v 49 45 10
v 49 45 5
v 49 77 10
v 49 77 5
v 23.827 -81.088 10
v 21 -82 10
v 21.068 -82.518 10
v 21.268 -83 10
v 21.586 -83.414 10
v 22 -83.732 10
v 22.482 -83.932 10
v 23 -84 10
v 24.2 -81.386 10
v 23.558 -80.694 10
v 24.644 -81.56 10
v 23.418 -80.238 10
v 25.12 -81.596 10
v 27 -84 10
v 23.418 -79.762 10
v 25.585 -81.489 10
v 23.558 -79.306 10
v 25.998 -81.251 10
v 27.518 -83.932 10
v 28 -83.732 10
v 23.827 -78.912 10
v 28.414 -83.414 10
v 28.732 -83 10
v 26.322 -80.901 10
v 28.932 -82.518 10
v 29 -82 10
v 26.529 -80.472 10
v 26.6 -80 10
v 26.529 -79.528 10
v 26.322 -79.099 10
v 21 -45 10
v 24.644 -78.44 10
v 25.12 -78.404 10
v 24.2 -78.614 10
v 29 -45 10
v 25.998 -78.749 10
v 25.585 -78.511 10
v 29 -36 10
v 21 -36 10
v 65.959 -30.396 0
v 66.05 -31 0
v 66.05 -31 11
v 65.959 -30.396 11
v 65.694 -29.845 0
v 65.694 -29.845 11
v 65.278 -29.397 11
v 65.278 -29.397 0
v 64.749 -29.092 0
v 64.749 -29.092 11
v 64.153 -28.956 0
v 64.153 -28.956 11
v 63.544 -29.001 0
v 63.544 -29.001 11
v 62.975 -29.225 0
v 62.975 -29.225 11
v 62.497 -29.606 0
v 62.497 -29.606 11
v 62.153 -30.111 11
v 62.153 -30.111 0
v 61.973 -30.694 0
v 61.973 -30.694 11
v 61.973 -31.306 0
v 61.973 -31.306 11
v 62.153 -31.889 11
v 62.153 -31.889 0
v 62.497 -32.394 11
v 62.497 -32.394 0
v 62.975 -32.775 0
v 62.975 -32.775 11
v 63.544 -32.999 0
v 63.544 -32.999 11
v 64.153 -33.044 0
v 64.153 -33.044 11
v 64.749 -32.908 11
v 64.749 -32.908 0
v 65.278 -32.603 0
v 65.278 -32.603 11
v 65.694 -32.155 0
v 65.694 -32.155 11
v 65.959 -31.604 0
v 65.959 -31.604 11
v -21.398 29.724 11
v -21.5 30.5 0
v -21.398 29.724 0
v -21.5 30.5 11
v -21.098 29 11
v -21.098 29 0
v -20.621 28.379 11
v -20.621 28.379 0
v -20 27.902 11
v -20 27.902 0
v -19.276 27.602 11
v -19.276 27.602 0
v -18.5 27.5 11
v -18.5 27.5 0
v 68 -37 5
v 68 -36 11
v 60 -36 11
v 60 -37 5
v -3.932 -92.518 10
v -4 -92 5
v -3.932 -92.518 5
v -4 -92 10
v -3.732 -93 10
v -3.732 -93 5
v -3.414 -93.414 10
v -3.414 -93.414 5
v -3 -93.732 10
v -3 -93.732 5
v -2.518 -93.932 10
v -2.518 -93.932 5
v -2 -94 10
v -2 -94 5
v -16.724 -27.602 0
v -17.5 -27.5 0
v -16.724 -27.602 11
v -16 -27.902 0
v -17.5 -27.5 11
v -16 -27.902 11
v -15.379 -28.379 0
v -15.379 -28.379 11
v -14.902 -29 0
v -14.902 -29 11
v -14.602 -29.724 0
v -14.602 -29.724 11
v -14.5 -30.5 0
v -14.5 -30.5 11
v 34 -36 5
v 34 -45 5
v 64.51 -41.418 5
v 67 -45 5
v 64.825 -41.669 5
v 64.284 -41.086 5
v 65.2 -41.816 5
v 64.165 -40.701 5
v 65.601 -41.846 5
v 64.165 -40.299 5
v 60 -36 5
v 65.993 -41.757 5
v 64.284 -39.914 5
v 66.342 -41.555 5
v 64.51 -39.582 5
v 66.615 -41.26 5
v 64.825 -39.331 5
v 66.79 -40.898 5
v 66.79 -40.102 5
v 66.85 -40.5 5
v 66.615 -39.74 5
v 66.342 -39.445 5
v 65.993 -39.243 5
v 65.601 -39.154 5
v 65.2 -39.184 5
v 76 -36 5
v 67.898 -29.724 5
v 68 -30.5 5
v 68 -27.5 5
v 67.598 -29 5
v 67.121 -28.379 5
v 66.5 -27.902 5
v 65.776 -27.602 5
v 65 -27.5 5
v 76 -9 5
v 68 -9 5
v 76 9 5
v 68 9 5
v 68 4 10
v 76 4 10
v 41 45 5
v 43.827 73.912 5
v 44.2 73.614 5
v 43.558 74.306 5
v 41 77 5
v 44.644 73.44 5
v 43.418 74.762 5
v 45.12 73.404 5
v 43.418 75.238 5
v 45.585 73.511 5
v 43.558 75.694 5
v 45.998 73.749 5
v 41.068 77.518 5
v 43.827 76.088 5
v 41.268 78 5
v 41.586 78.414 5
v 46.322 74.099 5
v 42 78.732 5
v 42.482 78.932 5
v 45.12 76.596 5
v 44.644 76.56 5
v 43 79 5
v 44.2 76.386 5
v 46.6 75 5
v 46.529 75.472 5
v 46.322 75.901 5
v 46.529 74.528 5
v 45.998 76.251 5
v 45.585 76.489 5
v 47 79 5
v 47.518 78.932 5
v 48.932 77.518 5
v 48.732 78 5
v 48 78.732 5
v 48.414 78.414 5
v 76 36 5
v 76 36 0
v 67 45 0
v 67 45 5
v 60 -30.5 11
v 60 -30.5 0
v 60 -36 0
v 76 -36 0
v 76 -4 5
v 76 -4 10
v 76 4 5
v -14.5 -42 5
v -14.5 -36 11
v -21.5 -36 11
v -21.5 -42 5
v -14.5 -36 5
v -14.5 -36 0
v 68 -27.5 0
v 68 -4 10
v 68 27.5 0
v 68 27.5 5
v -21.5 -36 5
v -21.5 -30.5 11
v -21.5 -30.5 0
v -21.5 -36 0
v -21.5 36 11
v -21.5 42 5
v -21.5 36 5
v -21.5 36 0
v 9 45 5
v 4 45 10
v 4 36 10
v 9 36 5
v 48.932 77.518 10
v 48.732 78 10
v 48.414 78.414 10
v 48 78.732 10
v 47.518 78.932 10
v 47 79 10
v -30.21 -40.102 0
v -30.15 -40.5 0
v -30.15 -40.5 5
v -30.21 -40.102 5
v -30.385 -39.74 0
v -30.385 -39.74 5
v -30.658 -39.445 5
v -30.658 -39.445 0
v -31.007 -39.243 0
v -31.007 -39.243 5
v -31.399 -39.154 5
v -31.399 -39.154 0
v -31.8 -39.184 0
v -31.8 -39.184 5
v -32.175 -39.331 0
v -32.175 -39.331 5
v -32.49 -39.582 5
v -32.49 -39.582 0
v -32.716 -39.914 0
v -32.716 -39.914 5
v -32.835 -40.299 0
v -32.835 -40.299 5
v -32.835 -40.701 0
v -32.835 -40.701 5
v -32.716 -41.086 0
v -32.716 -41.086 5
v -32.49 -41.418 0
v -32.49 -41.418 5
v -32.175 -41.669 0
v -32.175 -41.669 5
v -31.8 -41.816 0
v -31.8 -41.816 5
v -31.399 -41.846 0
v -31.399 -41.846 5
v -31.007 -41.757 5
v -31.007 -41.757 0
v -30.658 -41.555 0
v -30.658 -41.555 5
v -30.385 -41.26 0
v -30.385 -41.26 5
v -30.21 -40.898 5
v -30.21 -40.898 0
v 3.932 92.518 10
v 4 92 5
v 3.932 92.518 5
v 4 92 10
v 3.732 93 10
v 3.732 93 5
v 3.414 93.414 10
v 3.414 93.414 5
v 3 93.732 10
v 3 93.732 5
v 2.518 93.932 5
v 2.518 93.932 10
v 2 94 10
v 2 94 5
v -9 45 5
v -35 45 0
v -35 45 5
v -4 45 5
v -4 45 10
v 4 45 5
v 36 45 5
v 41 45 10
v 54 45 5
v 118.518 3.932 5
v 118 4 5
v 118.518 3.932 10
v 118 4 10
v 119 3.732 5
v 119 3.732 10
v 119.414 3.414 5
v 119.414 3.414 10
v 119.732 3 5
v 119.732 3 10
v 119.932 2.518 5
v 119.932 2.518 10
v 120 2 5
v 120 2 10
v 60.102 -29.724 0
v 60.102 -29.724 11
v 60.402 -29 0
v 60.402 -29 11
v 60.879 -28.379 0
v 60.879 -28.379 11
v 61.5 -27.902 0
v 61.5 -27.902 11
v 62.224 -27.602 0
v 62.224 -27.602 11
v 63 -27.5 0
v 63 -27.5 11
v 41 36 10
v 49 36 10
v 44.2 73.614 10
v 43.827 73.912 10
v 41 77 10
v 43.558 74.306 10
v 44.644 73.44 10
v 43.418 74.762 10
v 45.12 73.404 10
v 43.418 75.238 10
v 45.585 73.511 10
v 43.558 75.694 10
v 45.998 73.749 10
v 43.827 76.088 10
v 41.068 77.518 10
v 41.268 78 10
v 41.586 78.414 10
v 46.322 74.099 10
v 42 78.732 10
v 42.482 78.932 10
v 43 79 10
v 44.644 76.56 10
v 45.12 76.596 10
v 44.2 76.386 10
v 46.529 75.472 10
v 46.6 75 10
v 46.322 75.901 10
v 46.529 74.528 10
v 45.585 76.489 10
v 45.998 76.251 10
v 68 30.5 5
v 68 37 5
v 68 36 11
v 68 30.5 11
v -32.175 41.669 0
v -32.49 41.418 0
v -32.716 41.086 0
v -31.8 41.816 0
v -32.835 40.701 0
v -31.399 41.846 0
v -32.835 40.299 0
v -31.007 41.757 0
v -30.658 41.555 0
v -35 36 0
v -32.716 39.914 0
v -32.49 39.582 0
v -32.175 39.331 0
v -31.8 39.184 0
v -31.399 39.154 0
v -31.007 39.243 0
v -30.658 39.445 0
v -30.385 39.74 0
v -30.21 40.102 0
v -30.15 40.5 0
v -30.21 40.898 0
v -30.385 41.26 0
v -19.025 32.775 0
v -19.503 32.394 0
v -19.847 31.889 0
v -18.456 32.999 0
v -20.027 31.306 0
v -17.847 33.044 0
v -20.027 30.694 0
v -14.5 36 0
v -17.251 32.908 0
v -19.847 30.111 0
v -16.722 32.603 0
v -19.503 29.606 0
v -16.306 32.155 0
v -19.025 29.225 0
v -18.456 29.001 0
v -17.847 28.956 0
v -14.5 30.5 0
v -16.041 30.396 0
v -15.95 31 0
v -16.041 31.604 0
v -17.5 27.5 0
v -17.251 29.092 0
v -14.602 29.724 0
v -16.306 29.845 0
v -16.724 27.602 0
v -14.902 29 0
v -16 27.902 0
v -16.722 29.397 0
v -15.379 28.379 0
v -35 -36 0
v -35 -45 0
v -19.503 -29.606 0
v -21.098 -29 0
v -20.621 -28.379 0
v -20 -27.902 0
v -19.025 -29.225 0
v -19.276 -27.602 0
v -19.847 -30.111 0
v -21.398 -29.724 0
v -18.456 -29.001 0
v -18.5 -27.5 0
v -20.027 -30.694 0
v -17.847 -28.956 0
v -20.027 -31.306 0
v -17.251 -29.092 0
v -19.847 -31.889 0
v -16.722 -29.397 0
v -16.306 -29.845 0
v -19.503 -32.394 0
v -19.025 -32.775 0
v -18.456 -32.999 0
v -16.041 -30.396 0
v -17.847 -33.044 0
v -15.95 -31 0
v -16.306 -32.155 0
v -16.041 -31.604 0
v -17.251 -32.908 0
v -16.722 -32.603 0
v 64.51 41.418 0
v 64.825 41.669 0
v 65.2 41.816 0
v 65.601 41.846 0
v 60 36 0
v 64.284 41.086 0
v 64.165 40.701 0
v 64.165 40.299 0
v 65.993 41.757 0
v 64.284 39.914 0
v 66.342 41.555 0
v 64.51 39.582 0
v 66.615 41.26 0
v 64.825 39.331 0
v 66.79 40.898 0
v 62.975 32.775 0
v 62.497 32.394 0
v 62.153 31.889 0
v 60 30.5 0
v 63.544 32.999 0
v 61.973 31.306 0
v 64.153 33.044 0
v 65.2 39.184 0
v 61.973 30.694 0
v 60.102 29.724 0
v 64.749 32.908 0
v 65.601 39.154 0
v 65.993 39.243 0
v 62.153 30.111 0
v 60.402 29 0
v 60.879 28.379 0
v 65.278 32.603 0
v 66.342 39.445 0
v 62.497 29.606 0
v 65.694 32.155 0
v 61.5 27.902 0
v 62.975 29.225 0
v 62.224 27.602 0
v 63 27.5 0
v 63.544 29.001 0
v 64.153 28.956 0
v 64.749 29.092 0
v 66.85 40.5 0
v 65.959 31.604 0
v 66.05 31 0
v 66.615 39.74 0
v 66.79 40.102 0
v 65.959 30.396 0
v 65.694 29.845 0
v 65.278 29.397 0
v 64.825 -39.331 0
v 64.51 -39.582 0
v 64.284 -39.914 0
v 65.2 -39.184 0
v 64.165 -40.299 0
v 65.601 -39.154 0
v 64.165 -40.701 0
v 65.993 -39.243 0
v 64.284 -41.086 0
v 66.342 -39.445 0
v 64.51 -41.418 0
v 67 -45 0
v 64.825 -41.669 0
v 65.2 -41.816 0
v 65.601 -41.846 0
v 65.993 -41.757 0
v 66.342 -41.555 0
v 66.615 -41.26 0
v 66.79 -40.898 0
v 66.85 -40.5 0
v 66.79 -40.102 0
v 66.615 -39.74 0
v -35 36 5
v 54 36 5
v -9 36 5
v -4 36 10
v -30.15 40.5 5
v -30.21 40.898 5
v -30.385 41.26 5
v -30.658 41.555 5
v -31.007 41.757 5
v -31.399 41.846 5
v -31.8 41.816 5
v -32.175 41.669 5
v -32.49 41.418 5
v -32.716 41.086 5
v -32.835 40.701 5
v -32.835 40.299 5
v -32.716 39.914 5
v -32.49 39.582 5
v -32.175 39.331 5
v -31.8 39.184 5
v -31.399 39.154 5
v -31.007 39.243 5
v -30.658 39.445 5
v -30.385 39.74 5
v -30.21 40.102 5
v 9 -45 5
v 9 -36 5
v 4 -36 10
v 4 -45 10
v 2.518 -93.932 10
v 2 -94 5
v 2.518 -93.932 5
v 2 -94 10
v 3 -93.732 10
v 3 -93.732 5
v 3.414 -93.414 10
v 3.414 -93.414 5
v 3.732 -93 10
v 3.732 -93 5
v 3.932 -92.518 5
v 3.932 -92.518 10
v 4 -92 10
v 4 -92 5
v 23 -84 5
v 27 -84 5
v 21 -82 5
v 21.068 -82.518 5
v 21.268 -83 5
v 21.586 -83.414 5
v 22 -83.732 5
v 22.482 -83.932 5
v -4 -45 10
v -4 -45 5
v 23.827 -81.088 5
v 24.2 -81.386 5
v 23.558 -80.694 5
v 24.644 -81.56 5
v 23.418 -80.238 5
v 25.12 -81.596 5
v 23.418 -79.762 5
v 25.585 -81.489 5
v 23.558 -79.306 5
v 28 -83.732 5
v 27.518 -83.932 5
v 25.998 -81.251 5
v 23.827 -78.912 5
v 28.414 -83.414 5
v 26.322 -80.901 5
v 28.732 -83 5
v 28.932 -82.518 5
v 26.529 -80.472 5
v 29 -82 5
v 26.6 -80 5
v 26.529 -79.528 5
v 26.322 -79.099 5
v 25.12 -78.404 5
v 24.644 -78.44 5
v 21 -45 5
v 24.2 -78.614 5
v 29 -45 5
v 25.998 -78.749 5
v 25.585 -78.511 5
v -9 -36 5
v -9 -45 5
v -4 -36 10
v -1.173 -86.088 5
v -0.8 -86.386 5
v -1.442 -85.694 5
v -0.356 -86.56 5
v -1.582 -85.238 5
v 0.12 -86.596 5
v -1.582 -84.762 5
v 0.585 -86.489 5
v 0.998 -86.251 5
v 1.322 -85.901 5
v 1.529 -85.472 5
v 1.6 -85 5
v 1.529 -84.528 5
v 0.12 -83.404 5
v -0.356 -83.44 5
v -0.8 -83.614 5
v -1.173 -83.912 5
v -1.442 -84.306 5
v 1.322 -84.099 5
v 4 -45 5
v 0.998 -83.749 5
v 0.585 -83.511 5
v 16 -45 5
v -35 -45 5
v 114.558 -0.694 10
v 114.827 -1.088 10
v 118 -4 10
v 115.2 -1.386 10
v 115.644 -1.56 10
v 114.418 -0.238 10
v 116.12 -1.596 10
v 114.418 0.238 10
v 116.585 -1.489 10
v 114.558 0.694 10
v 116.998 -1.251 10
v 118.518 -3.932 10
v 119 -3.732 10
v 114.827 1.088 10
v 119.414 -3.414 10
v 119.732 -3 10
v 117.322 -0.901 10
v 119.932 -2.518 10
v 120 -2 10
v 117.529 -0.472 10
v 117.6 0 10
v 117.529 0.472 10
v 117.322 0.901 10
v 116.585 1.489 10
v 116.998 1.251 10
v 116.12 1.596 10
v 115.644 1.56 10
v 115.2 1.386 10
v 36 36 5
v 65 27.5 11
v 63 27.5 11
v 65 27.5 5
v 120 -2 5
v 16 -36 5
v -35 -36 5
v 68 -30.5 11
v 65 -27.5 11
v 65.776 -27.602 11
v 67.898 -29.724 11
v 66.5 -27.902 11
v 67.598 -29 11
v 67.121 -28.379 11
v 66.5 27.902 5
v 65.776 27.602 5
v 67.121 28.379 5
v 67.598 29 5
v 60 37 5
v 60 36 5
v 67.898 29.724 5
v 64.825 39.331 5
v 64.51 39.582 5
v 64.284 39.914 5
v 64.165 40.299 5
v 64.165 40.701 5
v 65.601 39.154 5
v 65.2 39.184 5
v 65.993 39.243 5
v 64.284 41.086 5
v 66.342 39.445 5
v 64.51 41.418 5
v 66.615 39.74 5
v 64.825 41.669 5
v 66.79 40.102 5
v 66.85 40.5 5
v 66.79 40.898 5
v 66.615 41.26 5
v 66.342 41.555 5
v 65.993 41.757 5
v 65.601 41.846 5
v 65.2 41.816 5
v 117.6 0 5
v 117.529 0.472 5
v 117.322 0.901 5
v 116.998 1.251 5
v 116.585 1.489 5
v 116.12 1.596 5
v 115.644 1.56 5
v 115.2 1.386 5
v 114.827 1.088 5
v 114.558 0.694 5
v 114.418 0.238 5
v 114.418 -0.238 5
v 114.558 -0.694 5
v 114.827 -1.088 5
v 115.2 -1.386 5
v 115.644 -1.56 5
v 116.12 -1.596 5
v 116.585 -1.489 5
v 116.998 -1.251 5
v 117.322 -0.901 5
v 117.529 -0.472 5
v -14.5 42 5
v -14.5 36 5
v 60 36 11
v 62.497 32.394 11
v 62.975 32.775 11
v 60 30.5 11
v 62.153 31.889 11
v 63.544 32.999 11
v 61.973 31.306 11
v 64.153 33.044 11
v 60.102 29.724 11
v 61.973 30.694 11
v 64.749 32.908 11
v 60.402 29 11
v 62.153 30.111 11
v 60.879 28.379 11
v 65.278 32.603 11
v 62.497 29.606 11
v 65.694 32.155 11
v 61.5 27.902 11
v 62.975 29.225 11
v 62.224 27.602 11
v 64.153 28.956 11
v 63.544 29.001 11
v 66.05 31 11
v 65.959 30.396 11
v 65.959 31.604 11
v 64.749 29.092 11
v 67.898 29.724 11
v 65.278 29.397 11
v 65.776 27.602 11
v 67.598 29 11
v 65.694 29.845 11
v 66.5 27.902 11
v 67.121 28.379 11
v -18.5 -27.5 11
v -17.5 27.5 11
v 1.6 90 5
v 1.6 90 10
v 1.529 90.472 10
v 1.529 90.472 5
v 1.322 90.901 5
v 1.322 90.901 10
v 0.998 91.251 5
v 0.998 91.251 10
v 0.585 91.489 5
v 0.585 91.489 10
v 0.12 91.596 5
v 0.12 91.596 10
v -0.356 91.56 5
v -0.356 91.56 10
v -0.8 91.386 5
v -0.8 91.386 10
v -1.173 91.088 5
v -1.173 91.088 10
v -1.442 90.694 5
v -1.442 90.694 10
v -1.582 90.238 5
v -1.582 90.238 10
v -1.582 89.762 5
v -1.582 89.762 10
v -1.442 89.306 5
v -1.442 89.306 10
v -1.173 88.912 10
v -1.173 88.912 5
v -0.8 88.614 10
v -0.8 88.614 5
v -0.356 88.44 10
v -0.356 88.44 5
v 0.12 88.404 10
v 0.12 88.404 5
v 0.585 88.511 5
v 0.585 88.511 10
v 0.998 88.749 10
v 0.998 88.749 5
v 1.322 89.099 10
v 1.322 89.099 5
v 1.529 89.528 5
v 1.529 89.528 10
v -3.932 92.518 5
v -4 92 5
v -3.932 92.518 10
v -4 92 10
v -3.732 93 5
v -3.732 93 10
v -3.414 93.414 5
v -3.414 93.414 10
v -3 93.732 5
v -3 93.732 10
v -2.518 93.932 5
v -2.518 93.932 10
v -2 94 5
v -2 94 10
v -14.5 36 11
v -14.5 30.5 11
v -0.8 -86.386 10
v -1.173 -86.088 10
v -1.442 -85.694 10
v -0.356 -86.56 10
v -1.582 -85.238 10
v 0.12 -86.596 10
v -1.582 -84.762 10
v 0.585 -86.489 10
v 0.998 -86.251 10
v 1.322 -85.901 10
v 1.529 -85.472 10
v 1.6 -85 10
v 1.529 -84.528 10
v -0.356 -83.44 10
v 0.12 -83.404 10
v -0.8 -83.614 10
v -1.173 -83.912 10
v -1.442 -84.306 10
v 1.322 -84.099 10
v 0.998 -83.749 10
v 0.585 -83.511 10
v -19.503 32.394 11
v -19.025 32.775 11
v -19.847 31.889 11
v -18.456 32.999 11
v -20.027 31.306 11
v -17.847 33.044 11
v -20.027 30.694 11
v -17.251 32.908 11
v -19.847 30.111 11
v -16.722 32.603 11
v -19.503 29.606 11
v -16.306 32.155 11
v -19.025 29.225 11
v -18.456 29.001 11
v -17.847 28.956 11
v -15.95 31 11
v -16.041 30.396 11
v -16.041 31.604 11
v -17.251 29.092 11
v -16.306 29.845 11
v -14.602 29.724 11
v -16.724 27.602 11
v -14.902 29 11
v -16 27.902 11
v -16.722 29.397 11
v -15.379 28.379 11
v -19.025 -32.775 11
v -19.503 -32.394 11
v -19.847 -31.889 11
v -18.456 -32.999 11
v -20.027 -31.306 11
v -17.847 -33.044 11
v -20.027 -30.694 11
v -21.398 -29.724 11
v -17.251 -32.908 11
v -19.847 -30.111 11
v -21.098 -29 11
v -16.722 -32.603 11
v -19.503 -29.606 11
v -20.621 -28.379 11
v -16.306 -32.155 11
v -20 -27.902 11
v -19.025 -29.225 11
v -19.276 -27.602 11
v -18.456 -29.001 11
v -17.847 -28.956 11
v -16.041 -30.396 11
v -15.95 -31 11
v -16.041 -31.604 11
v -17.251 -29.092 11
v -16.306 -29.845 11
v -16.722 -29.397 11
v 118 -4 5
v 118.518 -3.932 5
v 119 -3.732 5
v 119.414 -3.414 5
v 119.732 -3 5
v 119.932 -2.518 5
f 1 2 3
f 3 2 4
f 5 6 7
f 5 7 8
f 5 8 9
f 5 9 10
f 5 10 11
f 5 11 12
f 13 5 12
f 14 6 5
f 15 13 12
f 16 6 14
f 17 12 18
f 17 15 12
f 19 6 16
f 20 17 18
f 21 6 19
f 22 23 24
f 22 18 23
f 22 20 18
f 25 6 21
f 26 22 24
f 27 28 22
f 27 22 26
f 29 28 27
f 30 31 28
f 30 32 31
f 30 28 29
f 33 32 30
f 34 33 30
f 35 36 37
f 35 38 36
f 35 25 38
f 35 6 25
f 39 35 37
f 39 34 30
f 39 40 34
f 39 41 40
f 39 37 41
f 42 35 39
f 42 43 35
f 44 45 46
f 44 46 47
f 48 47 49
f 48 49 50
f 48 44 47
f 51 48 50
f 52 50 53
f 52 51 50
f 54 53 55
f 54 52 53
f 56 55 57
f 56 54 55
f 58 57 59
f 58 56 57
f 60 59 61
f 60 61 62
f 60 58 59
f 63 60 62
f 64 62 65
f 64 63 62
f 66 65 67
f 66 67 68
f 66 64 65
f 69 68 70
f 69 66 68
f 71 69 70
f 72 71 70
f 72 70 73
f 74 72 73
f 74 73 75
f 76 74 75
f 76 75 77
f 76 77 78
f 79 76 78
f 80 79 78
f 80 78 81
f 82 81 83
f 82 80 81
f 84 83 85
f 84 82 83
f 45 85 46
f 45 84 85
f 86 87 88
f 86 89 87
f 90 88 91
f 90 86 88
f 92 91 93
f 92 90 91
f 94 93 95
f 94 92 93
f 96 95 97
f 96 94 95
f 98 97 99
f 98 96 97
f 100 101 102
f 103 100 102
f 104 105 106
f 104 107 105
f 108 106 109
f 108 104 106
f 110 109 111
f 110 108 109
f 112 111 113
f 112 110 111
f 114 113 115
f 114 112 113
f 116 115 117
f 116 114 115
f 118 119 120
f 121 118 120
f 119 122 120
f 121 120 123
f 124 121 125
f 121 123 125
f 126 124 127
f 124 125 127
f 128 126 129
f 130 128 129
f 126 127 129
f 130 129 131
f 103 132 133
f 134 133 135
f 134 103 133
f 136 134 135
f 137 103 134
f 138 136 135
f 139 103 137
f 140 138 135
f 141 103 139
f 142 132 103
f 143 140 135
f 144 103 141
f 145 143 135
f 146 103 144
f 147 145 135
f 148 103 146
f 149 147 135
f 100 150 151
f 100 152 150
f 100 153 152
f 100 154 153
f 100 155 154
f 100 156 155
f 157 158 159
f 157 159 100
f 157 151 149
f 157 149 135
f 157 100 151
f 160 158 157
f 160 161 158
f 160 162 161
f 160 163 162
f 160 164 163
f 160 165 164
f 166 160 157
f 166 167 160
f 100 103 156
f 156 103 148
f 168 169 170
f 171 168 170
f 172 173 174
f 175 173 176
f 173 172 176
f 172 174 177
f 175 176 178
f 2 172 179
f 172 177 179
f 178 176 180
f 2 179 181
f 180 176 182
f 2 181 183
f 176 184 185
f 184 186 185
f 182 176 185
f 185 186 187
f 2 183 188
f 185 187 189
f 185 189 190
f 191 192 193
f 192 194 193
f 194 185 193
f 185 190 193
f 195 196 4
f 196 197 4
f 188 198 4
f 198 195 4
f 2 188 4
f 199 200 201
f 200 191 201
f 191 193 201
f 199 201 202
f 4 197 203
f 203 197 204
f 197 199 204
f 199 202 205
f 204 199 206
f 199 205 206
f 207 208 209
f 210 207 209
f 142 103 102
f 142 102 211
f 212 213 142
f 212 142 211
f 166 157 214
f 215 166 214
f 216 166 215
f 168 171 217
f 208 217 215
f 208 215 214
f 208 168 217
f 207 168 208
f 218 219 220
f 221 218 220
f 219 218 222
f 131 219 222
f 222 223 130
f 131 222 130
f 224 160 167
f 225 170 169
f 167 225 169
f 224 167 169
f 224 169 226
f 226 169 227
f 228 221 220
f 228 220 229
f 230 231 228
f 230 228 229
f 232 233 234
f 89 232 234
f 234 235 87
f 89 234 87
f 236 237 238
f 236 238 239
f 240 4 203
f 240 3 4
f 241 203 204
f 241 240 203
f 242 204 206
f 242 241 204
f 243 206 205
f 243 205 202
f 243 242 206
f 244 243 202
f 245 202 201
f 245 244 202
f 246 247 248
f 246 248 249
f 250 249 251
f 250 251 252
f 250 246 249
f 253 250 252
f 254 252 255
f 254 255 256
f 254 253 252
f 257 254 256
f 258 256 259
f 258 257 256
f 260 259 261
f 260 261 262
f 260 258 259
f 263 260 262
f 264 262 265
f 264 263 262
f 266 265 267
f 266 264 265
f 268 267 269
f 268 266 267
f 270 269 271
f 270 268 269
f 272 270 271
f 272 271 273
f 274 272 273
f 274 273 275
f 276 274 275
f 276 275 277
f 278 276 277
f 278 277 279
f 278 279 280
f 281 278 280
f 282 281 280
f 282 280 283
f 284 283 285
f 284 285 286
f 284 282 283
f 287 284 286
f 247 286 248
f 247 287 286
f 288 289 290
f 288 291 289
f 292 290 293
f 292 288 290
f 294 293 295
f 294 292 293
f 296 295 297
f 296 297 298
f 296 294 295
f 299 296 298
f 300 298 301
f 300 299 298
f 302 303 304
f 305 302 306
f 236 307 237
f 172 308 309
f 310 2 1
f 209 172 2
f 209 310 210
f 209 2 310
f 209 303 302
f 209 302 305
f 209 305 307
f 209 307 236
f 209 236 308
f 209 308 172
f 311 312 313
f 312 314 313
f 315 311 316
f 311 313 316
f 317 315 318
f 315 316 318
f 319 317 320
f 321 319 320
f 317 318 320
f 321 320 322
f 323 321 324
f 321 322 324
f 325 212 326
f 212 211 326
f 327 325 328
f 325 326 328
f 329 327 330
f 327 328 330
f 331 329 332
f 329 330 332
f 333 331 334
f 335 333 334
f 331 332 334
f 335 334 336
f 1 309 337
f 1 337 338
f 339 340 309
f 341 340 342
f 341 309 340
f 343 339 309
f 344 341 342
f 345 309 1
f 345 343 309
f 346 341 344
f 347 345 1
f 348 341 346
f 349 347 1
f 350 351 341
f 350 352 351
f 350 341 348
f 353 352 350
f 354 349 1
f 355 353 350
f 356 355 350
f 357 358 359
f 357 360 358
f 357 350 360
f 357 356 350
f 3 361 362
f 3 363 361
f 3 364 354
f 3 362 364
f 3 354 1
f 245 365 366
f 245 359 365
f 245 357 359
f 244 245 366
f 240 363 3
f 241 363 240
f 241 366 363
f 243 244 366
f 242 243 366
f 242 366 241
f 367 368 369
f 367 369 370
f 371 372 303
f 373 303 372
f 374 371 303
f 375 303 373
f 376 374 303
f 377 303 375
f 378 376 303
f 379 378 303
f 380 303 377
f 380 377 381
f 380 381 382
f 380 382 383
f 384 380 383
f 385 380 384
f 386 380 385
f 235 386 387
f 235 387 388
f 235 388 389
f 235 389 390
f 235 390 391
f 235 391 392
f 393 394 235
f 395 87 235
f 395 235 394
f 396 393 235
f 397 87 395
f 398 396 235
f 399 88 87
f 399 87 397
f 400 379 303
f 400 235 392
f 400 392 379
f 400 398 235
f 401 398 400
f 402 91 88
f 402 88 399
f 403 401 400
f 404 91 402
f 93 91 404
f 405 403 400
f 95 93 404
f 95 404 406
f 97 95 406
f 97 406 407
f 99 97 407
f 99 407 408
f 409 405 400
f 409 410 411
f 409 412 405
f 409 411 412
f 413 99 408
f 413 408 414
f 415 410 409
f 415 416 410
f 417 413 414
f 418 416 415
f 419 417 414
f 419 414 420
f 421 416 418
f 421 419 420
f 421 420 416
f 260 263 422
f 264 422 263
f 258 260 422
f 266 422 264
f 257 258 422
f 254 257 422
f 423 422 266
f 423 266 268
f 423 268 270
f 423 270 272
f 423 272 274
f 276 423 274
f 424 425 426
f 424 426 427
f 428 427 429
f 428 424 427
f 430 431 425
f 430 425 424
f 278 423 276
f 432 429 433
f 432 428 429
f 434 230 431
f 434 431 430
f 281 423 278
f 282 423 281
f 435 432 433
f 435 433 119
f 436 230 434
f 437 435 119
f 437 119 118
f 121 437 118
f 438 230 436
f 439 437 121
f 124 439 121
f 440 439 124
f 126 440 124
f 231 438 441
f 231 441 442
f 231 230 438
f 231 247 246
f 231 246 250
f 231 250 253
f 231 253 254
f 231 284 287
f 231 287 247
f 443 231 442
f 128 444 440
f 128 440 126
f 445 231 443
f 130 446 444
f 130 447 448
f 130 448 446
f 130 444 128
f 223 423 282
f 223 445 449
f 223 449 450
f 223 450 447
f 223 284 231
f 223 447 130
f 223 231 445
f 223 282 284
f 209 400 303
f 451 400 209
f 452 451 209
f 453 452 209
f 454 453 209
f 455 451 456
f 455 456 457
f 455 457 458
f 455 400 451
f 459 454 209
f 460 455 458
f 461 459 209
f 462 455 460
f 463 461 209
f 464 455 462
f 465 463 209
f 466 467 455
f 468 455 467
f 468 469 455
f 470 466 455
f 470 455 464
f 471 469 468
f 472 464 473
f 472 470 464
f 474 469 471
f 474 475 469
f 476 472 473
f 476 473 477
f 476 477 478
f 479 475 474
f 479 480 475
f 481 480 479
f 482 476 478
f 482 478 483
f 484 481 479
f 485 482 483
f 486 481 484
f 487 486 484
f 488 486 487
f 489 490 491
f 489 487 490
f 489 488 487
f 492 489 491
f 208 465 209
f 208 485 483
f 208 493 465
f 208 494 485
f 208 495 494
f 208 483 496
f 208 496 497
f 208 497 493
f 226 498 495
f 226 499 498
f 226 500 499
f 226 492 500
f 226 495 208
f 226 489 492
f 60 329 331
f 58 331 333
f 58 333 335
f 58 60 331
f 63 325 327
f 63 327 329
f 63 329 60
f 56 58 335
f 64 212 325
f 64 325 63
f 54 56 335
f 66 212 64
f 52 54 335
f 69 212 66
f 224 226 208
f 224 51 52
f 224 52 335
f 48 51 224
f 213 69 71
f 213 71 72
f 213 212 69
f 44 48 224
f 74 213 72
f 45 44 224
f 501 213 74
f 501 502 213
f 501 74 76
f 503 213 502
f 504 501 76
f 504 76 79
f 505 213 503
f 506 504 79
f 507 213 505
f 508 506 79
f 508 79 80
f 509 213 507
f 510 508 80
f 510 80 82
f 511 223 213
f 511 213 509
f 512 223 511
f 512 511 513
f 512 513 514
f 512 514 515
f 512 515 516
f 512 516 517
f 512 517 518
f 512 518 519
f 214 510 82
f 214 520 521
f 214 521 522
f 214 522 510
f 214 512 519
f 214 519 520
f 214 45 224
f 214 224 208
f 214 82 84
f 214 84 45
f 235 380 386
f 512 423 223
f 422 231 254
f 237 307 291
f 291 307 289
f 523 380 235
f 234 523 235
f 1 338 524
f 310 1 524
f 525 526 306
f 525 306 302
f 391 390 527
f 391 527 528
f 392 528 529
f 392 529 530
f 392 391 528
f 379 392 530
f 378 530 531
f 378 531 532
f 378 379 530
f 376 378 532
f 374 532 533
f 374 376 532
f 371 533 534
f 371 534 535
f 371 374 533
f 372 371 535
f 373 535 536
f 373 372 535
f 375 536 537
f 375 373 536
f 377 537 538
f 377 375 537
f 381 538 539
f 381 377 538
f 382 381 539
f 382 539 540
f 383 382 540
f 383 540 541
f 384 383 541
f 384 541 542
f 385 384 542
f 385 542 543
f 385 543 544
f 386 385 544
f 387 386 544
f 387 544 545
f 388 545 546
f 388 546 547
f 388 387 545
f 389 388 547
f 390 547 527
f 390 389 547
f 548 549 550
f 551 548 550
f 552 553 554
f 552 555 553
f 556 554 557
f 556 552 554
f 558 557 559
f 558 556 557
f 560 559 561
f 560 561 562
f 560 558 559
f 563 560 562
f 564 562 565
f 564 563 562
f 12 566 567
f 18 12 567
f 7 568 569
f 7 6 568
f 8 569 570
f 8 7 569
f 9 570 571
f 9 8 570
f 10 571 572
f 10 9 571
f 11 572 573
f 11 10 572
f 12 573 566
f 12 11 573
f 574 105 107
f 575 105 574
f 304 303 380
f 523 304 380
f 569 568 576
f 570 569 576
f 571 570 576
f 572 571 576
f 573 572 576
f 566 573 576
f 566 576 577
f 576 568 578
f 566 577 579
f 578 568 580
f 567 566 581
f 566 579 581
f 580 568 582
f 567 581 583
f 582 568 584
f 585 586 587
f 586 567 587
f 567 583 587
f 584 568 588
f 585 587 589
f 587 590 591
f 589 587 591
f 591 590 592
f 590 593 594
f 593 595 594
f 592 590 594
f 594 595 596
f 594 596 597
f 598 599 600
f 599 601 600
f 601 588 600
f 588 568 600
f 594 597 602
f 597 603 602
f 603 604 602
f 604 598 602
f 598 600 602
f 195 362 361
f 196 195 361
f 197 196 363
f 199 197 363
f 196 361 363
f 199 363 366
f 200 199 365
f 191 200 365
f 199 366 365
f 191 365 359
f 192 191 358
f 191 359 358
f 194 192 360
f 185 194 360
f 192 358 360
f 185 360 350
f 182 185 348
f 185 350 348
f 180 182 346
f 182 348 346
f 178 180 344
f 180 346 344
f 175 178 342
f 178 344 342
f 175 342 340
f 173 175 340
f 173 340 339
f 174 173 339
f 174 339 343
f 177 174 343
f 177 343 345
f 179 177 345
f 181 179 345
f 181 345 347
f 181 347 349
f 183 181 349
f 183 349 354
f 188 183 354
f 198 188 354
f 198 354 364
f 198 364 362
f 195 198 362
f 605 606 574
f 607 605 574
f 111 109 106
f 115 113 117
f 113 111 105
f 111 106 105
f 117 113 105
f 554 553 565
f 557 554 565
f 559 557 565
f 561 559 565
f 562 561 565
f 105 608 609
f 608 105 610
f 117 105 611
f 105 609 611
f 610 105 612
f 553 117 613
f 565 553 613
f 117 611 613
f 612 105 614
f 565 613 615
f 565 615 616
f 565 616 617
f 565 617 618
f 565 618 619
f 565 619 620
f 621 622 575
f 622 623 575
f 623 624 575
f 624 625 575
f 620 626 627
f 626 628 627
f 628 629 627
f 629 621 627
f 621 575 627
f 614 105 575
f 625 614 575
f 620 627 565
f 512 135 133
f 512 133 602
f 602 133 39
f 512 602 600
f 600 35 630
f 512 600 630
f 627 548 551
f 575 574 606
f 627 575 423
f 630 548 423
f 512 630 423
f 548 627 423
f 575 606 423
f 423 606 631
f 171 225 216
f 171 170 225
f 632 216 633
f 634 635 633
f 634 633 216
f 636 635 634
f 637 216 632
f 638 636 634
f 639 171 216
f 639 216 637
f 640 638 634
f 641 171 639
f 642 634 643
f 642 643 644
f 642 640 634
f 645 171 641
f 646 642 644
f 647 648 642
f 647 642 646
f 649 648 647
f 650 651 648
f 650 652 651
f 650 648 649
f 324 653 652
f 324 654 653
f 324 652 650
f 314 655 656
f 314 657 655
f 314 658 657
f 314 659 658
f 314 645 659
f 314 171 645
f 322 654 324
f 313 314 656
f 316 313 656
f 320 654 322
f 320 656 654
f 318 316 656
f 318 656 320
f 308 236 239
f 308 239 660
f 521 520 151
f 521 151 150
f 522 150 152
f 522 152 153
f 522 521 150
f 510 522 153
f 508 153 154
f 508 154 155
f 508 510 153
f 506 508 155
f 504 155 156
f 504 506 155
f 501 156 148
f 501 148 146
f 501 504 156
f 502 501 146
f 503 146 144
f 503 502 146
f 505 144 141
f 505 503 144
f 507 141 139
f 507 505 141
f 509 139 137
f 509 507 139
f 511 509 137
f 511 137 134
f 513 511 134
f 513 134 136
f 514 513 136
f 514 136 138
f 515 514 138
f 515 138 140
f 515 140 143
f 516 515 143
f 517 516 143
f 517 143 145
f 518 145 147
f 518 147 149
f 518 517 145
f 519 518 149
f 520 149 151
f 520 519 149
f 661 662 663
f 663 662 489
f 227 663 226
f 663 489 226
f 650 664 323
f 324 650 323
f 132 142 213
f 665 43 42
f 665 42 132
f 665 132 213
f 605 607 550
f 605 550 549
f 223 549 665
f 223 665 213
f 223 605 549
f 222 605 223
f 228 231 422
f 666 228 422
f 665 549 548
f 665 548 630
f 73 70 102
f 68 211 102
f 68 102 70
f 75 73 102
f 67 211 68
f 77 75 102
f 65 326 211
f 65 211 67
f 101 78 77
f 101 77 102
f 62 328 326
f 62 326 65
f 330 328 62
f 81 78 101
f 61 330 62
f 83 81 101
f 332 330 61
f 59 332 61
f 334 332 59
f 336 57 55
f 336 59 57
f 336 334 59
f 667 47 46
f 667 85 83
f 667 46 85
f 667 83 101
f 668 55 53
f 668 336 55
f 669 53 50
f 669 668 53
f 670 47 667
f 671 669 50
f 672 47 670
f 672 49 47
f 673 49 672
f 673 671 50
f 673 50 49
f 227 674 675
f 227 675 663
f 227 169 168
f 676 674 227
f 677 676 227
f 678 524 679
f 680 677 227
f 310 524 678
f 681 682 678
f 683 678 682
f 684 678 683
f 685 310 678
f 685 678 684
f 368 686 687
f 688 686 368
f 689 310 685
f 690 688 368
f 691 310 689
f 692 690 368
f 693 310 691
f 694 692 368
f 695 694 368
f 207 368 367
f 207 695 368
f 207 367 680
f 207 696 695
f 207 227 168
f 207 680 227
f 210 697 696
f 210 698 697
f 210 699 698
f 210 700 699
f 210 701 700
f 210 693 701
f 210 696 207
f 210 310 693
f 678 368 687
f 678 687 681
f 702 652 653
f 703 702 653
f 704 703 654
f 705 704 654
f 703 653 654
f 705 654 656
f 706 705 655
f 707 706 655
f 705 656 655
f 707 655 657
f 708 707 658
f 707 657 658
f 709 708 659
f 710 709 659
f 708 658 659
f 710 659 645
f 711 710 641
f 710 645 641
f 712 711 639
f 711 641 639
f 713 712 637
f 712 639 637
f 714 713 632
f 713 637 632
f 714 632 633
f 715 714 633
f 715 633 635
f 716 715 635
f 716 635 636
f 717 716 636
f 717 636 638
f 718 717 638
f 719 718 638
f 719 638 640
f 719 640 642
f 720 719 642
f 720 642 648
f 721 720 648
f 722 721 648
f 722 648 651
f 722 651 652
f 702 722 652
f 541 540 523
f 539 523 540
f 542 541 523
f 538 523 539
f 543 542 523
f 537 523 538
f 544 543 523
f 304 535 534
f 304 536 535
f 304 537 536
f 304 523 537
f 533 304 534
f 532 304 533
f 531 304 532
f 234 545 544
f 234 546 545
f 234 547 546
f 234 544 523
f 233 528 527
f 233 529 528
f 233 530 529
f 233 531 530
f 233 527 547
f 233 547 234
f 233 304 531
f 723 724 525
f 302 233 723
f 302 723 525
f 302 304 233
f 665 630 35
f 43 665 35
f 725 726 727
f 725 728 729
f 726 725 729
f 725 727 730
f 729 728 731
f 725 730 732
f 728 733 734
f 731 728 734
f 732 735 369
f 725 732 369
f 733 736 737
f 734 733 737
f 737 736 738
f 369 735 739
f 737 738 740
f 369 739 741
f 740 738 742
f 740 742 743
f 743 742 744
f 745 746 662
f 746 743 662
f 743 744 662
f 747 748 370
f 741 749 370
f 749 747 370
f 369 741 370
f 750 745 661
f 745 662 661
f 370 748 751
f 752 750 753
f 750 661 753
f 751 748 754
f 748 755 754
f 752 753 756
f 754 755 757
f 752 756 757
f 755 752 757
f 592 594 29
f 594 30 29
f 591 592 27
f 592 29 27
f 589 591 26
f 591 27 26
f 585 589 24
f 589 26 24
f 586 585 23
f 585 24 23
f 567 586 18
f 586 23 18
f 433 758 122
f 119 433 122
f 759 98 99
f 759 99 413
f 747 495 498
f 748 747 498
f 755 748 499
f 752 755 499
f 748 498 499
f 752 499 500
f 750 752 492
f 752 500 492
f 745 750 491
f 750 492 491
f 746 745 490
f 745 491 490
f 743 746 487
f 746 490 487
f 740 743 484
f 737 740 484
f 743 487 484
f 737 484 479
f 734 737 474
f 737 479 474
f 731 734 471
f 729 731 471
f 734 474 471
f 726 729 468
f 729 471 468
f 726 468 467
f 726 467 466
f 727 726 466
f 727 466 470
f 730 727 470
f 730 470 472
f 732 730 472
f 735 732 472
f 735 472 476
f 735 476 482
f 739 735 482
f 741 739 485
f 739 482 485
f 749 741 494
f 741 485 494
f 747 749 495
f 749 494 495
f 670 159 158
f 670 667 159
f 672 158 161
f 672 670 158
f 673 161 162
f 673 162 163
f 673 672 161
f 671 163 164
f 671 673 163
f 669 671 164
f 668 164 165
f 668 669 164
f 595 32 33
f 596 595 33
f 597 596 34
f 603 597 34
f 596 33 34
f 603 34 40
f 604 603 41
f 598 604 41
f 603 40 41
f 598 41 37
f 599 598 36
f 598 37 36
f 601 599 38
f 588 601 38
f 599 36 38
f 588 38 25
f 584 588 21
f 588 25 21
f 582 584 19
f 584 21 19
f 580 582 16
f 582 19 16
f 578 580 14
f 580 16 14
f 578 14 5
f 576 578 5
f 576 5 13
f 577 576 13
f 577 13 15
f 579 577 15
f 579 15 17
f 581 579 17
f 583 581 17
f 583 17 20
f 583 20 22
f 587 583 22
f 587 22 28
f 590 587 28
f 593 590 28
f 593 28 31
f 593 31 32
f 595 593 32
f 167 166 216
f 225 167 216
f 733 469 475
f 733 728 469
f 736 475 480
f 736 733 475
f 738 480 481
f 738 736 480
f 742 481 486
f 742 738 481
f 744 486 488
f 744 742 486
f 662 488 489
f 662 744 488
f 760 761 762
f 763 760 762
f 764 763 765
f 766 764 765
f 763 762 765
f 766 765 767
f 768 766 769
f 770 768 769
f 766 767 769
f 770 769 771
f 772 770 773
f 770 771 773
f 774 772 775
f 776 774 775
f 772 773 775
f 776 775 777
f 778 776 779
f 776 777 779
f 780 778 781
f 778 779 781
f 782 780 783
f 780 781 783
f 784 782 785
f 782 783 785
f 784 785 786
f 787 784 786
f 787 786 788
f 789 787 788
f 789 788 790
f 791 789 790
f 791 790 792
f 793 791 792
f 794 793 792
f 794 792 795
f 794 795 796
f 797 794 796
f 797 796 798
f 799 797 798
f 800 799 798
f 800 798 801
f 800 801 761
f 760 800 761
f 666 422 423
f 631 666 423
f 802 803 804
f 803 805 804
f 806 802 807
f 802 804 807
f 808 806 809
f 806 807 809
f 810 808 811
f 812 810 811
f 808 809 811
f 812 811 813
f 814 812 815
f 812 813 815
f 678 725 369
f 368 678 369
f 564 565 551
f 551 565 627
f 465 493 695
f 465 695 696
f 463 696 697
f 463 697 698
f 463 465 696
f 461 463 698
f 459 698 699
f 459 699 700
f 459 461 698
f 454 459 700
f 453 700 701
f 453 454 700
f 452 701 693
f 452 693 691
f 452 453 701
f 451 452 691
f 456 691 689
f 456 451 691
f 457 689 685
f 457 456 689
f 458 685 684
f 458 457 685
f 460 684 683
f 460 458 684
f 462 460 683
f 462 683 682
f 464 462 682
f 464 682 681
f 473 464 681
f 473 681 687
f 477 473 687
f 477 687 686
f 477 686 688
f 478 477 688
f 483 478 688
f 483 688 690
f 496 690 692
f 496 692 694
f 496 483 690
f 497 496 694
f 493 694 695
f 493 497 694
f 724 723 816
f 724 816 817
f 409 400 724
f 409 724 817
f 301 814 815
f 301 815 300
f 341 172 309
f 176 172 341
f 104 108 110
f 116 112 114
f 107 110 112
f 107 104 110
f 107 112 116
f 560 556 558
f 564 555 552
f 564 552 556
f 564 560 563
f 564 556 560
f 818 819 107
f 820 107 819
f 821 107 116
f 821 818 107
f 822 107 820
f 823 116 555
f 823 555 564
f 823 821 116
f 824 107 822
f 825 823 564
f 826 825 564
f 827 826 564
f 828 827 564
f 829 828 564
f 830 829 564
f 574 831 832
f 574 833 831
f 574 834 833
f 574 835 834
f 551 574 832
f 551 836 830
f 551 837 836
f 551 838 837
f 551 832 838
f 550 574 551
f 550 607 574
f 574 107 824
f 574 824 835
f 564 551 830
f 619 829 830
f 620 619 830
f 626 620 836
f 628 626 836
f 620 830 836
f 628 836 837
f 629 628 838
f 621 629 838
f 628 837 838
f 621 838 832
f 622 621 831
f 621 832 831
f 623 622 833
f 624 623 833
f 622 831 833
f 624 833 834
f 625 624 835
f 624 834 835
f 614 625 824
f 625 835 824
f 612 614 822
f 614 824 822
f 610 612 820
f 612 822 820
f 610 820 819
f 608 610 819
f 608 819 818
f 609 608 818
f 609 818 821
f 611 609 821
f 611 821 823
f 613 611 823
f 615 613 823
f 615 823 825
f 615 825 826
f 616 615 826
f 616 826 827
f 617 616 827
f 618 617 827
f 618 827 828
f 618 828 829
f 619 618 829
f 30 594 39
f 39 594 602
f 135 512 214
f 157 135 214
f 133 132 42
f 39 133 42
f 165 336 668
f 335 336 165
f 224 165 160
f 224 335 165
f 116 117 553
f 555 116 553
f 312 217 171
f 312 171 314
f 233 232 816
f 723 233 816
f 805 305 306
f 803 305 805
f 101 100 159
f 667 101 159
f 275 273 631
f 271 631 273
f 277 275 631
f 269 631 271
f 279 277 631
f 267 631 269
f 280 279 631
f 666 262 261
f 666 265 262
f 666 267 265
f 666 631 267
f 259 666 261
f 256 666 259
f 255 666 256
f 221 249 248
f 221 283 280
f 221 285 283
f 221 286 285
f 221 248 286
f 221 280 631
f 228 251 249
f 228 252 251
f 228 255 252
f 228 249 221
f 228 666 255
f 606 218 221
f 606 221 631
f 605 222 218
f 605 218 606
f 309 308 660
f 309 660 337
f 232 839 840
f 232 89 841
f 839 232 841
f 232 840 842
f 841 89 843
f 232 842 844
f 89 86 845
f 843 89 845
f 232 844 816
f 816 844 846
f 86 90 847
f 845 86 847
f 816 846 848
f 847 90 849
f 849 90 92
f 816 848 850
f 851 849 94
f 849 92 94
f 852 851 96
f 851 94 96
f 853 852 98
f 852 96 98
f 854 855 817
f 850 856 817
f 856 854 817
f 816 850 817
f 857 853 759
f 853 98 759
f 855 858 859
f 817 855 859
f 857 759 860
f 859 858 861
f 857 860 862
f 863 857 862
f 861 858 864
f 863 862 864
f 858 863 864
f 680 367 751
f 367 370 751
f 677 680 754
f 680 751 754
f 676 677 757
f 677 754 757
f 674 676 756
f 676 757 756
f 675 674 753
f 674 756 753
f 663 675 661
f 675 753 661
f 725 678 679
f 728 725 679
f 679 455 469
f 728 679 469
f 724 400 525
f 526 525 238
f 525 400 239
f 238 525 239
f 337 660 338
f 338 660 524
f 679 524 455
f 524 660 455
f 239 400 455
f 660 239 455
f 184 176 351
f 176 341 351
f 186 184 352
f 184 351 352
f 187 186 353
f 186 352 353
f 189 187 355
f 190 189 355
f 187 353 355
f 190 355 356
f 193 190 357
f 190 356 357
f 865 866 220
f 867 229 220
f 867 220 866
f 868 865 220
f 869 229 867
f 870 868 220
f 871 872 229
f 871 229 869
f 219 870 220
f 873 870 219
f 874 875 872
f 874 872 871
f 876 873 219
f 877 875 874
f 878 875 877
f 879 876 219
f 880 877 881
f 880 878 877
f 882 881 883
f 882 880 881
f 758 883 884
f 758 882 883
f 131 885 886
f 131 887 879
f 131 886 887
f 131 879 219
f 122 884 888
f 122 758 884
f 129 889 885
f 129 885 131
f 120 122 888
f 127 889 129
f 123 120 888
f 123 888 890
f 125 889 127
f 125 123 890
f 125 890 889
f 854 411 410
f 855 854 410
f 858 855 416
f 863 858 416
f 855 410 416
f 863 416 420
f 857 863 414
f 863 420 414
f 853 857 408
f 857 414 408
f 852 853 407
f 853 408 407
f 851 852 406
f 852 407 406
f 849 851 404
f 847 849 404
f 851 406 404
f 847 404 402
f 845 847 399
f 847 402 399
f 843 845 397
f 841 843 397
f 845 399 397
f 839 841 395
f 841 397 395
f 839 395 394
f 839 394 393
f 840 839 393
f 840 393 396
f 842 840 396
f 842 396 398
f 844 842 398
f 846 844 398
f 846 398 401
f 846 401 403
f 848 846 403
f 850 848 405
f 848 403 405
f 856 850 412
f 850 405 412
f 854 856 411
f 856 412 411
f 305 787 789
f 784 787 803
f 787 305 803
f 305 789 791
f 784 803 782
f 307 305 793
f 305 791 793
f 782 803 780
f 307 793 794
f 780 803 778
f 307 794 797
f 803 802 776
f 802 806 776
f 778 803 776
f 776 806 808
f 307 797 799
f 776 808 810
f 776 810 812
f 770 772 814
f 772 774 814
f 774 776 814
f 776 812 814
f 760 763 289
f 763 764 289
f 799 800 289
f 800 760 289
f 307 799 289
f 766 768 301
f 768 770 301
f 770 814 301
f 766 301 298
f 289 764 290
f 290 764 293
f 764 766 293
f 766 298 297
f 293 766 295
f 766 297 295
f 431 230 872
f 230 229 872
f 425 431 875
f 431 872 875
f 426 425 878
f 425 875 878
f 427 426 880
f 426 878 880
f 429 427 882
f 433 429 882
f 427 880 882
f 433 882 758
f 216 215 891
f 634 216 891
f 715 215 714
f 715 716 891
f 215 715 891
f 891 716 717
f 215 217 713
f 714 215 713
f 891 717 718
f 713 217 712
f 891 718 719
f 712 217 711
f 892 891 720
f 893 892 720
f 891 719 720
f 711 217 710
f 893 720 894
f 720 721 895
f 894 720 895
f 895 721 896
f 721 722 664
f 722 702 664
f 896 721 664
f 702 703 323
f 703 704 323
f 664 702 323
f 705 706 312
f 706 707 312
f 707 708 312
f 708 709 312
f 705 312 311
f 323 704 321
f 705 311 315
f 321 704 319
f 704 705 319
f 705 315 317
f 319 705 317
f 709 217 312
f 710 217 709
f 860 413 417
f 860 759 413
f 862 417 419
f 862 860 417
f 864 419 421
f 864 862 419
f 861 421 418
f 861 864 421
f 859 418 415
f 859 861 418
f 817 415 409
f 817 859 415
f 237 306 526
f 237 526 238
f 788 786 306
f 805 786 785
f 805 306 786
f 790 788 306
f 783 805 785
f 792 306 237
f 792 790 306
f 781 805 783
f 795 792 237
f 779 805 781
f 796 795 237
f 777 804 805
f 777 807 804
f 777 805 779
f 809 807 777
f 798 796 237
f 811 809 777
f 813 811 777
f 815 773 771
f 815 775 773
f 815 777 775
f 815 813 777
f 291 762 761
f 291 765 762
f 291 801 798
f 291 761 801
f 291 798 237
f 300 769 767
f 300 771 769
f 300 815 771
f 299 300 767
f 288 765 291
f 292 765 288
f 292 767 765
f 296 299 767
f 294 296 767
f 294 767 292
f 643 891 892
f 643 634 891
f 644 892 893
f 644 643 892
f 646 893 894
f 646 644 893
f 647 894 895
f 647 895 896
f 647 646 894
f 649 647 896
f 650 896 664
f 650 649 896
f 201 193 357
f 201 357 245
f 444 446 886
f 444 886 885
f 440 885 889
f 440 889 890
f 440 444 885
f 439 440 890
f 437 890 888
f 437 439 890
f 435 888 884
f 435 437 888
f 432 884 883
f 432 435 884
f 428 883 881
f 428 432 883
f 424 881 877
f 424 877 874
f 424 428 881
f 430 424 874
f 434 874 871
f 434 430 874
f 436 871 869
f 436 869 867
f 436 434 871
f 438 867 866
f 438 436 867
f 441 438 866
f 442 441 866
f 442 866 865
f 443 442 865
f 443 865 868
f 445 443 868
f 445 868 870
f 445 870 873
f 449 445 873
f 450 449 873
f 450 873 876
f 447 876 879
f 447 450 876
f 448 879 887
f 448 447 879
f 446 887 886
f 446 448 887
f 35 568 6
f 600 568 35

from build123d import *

# Parameters (mm, degrees)
SKETCH2_R           = 1.35
BOSS_EXTRUDE2_DEPTH = 5
BOSS_EXTRUDE3_START = -5
SKETCH3_W           = 7
SKETCH3_H           = 8.5
SKETCH3_R           = 2.05
SKETCH3_W_2         = 8
BOSS_EXTRUDE3_DEPTH = 11
FILLET1_R           = 3
CHAMFER1_SIZE       = 6
CHAMFER2_SIZE2      = 6
CHAMFER2_SIZE       = 1
FILLET2_R           = 3
CHAMFER4_SIZE       = 6
CHAMFER5_SIZE2      = 6
CHAMFER5_SIZE       = 1
SKETCH4_W           = 8
SKETCH4_H           = 9
BOSS_EXTRUDE4_DEPTH = 8
SKETCH5_R           = 2.05
CUT_EXTRUDE1_DEPTH  = 9
SKETCH6_W           = 8
SKETCH6_H           = 8
BOSS_EXTRUDE5_DEPTH = 8
SKETCH7_R           = 2.05
CUT_EXTRUDE2_DEPTH  = 8
SKETCH8_W           = 8
SKETCH8_H           = 9
SKETCH8_H_2         = 8
CUT_EXTRUDE4_DEPTH  = 8
SKETCH9_W           = 8
SKETCH9_H           = 58
SKETCH9_H_2         = 43
SKETCH9_H_3         = 48
SKETCH9_W_2         = 52
SKETCH9_H_4         = 8
BOSS_EXTRUDE6_DEPTH = 5
SKETCH10_R          = 1.6
CUT_EXTRUDE5_DEPTH  = 153.761251631
FILLET3_R           = 2
CHAMFER6_SIZE       = 5


# Some blends are built 0.0001 mm under size
with BuildPart() as part:
    # Sketch2 → Boss-Extrude2 (new body)
    with BuildSketch(Plane.XY):
        Polygon((-35, -45), (67, -45), (76, -36), (76, 36), (67, 45), (-35, 45), (-35, 36), (68, 36), (68, -36), (-35, -36), align=None)
        with Locations((-31.5, -40.5)):
            Circle(SKETCH2_R, mode=Mode.SUBTRACT)
        with Locations((-31.5, 40.5)):
            Circle(SKETCH2_R, mode=Mode.SUBTRACT)
        with Locations((65.5, 40.5)):
            Circle(SKETCH2_R, mode=Mode.SUBTRACT)
        with Locations((65.5, -40.5)):
            Circle(SKETCH2_R, mode=Mode.SUBTRACT)
    extrude(amount=BOSS_EXTRUDE2_DEPTH)

    # Sketch3 → Boss-Extrude3 (add)
    # profile 1 of 2: a face of its own
    with BuildSketch(Plane.XY.offset(5).offset(BOSS_EXTRUDE3_START)):
        with Locations((-18, -31.75)):
            Rectangle(SKETCH3_W, SKETCH3_H)
        with Locations((-18, -31)):
            Circle(SKETCH3_R, mode=Mode.SUBTRACT)
    # profile 2 of 2: a face of its own
    with BuildSketch(Plane.XY.offset(5).offset(BOSS_EXTRUDE3_START)):
        with Locations((64, -31.75)):
            Rectangle(SKETCH3_W_2, SKETCH3_H)
        with Locations((64, -31)):
            Circle(SKETCH3_R, mode=Mode.SUBTRACT)
    boss_extrude3 = extrude(amount=BOSS_EXTRUDE3_DEPTH)

    # Fillet1
    fillet1_edges = [part.edges().sort_by_distance(p)[0] for p in [
        (-21.5, -27.5, 5.5),
        (-14.5, -27.5, 5.5),
        (68, -27.5, 8),
        (60, -27.5, 5.5),
    ]]
    fillet(fillet1_edges, radius=FILLET1_R)

    # Chamfer1
    chamfer1_edges = [part.edges().sort_by_distance(p)[0] for p in [
        (-18, -36, 5),
    ]]
    chamfer(chamfer1_edges, length=CHAMFER1_SIZE - 0.0001)  # a hair under: the kernel refuses the full size

    # Chamfer2
    chamfer2_edges = [part.edges().sort_by_distance(p)[0] for p in [
        (64, -36, 5),
    ]]
    chamfer2_side = [part.faces().sort_by_distance(p)[0] for p in [
        (64, -36.02, 5),
    ]]
    chamfer(chamfer2_edges, length=CHAMFER2_SIZE - 0.0001, length2=CHAMFER2_SIZE2 - 0.0001, reference=chamfer2_side[0])  # a hair under: the kernel refuses the full size

    # Mirror5: Boss-Extrude3 across plane
    add(boss_extrude3.mirror(Plane(origin=(0, 0, 0), x_dir=(0, 0, 1), z_dir=(0, -1, 0))))

    # Fillet2
    fillet2_edges = [part.edges().sort_by_distance(p)[0] for p in [
        (-21.5, 27.5, 5.5),
        (-14.5, 27.5, 5.5),
        (68, 27.5, 8),
        (60, 27.5, 5.5),
    ]]
    fillet(fillet2_edges, radius=FILLET2_R)

    # Chamfer4
    chamfer4_edges = [part.edges().sort_by_distance(p)[0] for p in [
        (-18, 36, 5),
    ]]
    chamfer(chamfer4_edges, length=CHAMFER4_SIZE - 0.0001)  # a hair under: the kernel refuses the full size

    # Chamfer5
    chamfer5_edges = [part.edges().sort_by_distance(p)[0] for p in [
        (64, 36, 5),
    ]]
    chamfer5_side = [part.faces().sort_by_distance(p)[0] for p in [
        (64, 36.02, 5),
    ]]
    chamfer(chamfer5_edges, length=CHAMFER5_SIZE - 0.0001, length2=CHAMFER5_SIZE2 - 0.0001, reference=chamfer5_side[0])  # a hair under: the kernel refuses the full size

    # Sketch4 → Boss-Extrude4 (add)
    with BuildSketch(Plane.XY.offset(5)):
        with Locations((-1, -40.5)):
            Rectangle(SKETCH4_W, SKETCH4_H)
        with Locations((32, -40.5)):
            Rectangle(SKETCH4_W, SKETCH4_H)
    boss_extrude4 = extrude(amount=BOSS_EXTRUDE4_DEPTH)

    # Sketch5 → Cut-Extrude1 (cut)
    with BuildSketch(Plane.XZ.offset(45)):
        with Locations(Location((-1, 9.5, 0), (0, 0, 270))):
            Circle(SKETCH5_R)
        with Locations(Location((32, 9.5, 0), (0, 0, 270))):
            Circle(SKETCH5_R)
    cut_extrude1 = extrude(amount=-CUT_EXTRUDE1_DEPTH, mode=Mode.SUBTRACT)

    # Mirror6: Boss-Extrude4, Cut-Extrude1 across plane
    add(boss_extrude4.mirror(Plane(origin=(0, 0, 0), x_dir=(0, 0, 1), z_dir=(0, -1, 0))))
    add(cut_extrude1.mirror(Plane(origin=(0, 0, 0), x_dir=(0, 0, 1), z_dir=(0, -1, 0))), mode=Mode.SUBTRACT)

    # Sketch6 → Boss-Extrude5 (add)
    with BuildSketch(Plane.XY.offset(5)):
        with Locations((72, 0)):
            Rectangle(SKETCH6_W, SKETCH6_H)
    extrude(amount=BOSS_EXTRUDE5_DEPTH)

    # Sketch7 → Cut-Extrude2 (cut)
    with BuildSketch(Plane(origin=(76, 0, 0), x_dir=(0, 0, -1), z_dir=(1, 0, 0))):
        with Locations(Location((-9.5, 0, 0), (0, 0, 90))):
            Circle(SKETCH7_R)
    extrude(amount=-CUT_EXTRUDE2_DEPTH, mode=Mode.SUBTRACT)

    # Sketch8 → Cut-Extrude4 (cut)
    with BuildSketch(Plane.XY.offset(5)):
        with Locations((-1, -40.5)):
            Rectangle(SKETCH8_W, SKETCH8_H)
        with Locations((32, -40.5)):
            Rectangle(SKETCH8_W, SKETCH8_H)
        with Locations((72, 0)):
            Rectangle(SKETCH8_W, SKETCH8_H_2)
        with Locations((32, 40.5)):
            Rectangle(SKETCH8_W, SKETCH8_H)
        with Locations((-1, 40.5)):
            Rectangle(SKETCH8_W, SKETCH8_H)
    extrude(amount=CUT_EXTRUDE4_DEPTH, mode=Mode.SUBTRACT)

    # Sketch9 → Boss-Extrude6 (add)
    with BuildSketch(Plane.XY.offset(5)):
        with Locations((0, -65)):
            Rectangle(SKETCH9_W, SKETCH9_H)
        with Locations((0, 65)):
            Rectangle(SKETCH9_W, SKETCH9_H)
        with Locations((45, 57.5)):
            Rectangle(SKETCH9_W, SKETCH9_H_2)
        with Locations((25, -60)):
            Rectangle(SKETCH9_W, SKETCH9_H_3)
        with Locations((94, 0)):
            Rectangle(SKETCH9_W_2, SKETCH9_H_4)
    extrude(amount=BOSS_EXTRUDE6_DEPTH)

    # Sketch10 → Cut-Extrude5 (cut, through all)
    with BuildSketch(Plane.XY.offset(10)):
        with Locations((0, -85)):
            Circle(SKETCH10_R)
        with Locations((0, 90)):
            Circle(SKETCH10_R)
        with Locations((45, 75)):
            Circle(SKETCH10_R)
        with Locations((116, 0)):
            Circle(SKETCH10_R)
        with Locations((25, -80)):
            Circle(SKETCH10_R)
    extrude(amount=-CUT_EXTRUDE5_DEPTH, mode=Mode.SUBTRACT)

    # Fillet3
    fillet3_edges = [part.edges().sort_by_distance(p)[0] for p in [
        (-4, -94, 7.5),
        (4, -94, 7.5),
        (-4, 94, 7.5),
        (4, 94, 7.5),
        (41, 79, 7.5),
        (49, 79, 7.5),
        (21, -84, 7.5),
        (29, -84, 7.5),
        (120, -4, 7.5),
        (120, 4, 7.5),
    ]]
    fillet(fillet3_edges, radius=FILLET3_R)

    # Chamfer6
    # the kernel refuses this chamfer: 5 mm, written as the material it adds along each edge
    with BuildSketch(Plane(origin=(21, -45, 5), x_dir=(-0.9996219169112968, 0, -0.027495876610586317), z_dir=(0, 1, 0)), Plane(origin=(-4, -45, 5), x_dir=(-0.9996219169112968, 0, -0.027495876610586327), z_dir=(0, 1, 0)), Plane(origin=(4, -36, 5), x_dir=(0.9996219169112968, 0, -0.027495876610586317), z_dir=(0, -1, 0)), Plane(origin=(29, -36, 5), x_dir=(0.9996219169112968, 0, -0.027495876610586337), z_dir=(0, -1, 0)), Plane(origin=(49, 36, 5), x_dir=(-0.027495876610586317, 0, 0.9996219169112968), z_dir=(0, 1, 0)), Plane(origin=(-4, 45, 5), x_dir=(0.027495876610586317, 0, 0.9996219169112968), z_dir=(0, -1, 0)), Plane(origin=(4, 36, 5), x_dir=(-0.027495876610586403, 0, 0.9996219169112968), z_dir=(0, 1, 0))) as chamfer6_piece_1:
        Polygon((CHAMFER6_SIZE * 0.999621916911, CHAMFER6_SIZE * 0.0274958766106), (-CHAMFER6_SIZE * 0.0274958766106, CHAMFER6_SIZE * 0.999621916911), (0, 0), align=None)
    extrude(amount=9)
    with BuildSketch(Plane(origin=(68, 4, 5), x_dir=(0, 0.9996219169112968, -0.027495876610586324), z_dir=(1, 0, 0)), Plane(origin=(76, -4, 5), x_dir=(0, -0.9996219169112968, -0.027495876610586324), z_dir=(-1, 0, 0))) as chamfer6_piece_2:
        Polygon((CHAMFER6_SIZE * 0.999621916911, CHAMFER6_SIZE * 0.0274958766106), (-CHAMFER6_SIZE * 0.0274958766106, CHAMFER6_SIZE * 0.999621916911), (0, 0), align=None)
    extrude(amount=8)
    with BuildSketch(Plane(origin=(41, 45, 5), x_dir=(-0.9996219169112968, 0, -0.027495876610586317), z_dir=(0, -1, 0))) as chamfer6_piece_3:
        Polygon((CHAMFER6_SIZE * 0.999621916911, -CHAMFER6_SIZE * 0.0274958766106), (-CHAMFER6_SIZE * 0.0274958766106, -CHAMFER6_SIZE * 0.999621916911), (0, 0), align=None)
    extrude(amount=9)


solid = part.part
